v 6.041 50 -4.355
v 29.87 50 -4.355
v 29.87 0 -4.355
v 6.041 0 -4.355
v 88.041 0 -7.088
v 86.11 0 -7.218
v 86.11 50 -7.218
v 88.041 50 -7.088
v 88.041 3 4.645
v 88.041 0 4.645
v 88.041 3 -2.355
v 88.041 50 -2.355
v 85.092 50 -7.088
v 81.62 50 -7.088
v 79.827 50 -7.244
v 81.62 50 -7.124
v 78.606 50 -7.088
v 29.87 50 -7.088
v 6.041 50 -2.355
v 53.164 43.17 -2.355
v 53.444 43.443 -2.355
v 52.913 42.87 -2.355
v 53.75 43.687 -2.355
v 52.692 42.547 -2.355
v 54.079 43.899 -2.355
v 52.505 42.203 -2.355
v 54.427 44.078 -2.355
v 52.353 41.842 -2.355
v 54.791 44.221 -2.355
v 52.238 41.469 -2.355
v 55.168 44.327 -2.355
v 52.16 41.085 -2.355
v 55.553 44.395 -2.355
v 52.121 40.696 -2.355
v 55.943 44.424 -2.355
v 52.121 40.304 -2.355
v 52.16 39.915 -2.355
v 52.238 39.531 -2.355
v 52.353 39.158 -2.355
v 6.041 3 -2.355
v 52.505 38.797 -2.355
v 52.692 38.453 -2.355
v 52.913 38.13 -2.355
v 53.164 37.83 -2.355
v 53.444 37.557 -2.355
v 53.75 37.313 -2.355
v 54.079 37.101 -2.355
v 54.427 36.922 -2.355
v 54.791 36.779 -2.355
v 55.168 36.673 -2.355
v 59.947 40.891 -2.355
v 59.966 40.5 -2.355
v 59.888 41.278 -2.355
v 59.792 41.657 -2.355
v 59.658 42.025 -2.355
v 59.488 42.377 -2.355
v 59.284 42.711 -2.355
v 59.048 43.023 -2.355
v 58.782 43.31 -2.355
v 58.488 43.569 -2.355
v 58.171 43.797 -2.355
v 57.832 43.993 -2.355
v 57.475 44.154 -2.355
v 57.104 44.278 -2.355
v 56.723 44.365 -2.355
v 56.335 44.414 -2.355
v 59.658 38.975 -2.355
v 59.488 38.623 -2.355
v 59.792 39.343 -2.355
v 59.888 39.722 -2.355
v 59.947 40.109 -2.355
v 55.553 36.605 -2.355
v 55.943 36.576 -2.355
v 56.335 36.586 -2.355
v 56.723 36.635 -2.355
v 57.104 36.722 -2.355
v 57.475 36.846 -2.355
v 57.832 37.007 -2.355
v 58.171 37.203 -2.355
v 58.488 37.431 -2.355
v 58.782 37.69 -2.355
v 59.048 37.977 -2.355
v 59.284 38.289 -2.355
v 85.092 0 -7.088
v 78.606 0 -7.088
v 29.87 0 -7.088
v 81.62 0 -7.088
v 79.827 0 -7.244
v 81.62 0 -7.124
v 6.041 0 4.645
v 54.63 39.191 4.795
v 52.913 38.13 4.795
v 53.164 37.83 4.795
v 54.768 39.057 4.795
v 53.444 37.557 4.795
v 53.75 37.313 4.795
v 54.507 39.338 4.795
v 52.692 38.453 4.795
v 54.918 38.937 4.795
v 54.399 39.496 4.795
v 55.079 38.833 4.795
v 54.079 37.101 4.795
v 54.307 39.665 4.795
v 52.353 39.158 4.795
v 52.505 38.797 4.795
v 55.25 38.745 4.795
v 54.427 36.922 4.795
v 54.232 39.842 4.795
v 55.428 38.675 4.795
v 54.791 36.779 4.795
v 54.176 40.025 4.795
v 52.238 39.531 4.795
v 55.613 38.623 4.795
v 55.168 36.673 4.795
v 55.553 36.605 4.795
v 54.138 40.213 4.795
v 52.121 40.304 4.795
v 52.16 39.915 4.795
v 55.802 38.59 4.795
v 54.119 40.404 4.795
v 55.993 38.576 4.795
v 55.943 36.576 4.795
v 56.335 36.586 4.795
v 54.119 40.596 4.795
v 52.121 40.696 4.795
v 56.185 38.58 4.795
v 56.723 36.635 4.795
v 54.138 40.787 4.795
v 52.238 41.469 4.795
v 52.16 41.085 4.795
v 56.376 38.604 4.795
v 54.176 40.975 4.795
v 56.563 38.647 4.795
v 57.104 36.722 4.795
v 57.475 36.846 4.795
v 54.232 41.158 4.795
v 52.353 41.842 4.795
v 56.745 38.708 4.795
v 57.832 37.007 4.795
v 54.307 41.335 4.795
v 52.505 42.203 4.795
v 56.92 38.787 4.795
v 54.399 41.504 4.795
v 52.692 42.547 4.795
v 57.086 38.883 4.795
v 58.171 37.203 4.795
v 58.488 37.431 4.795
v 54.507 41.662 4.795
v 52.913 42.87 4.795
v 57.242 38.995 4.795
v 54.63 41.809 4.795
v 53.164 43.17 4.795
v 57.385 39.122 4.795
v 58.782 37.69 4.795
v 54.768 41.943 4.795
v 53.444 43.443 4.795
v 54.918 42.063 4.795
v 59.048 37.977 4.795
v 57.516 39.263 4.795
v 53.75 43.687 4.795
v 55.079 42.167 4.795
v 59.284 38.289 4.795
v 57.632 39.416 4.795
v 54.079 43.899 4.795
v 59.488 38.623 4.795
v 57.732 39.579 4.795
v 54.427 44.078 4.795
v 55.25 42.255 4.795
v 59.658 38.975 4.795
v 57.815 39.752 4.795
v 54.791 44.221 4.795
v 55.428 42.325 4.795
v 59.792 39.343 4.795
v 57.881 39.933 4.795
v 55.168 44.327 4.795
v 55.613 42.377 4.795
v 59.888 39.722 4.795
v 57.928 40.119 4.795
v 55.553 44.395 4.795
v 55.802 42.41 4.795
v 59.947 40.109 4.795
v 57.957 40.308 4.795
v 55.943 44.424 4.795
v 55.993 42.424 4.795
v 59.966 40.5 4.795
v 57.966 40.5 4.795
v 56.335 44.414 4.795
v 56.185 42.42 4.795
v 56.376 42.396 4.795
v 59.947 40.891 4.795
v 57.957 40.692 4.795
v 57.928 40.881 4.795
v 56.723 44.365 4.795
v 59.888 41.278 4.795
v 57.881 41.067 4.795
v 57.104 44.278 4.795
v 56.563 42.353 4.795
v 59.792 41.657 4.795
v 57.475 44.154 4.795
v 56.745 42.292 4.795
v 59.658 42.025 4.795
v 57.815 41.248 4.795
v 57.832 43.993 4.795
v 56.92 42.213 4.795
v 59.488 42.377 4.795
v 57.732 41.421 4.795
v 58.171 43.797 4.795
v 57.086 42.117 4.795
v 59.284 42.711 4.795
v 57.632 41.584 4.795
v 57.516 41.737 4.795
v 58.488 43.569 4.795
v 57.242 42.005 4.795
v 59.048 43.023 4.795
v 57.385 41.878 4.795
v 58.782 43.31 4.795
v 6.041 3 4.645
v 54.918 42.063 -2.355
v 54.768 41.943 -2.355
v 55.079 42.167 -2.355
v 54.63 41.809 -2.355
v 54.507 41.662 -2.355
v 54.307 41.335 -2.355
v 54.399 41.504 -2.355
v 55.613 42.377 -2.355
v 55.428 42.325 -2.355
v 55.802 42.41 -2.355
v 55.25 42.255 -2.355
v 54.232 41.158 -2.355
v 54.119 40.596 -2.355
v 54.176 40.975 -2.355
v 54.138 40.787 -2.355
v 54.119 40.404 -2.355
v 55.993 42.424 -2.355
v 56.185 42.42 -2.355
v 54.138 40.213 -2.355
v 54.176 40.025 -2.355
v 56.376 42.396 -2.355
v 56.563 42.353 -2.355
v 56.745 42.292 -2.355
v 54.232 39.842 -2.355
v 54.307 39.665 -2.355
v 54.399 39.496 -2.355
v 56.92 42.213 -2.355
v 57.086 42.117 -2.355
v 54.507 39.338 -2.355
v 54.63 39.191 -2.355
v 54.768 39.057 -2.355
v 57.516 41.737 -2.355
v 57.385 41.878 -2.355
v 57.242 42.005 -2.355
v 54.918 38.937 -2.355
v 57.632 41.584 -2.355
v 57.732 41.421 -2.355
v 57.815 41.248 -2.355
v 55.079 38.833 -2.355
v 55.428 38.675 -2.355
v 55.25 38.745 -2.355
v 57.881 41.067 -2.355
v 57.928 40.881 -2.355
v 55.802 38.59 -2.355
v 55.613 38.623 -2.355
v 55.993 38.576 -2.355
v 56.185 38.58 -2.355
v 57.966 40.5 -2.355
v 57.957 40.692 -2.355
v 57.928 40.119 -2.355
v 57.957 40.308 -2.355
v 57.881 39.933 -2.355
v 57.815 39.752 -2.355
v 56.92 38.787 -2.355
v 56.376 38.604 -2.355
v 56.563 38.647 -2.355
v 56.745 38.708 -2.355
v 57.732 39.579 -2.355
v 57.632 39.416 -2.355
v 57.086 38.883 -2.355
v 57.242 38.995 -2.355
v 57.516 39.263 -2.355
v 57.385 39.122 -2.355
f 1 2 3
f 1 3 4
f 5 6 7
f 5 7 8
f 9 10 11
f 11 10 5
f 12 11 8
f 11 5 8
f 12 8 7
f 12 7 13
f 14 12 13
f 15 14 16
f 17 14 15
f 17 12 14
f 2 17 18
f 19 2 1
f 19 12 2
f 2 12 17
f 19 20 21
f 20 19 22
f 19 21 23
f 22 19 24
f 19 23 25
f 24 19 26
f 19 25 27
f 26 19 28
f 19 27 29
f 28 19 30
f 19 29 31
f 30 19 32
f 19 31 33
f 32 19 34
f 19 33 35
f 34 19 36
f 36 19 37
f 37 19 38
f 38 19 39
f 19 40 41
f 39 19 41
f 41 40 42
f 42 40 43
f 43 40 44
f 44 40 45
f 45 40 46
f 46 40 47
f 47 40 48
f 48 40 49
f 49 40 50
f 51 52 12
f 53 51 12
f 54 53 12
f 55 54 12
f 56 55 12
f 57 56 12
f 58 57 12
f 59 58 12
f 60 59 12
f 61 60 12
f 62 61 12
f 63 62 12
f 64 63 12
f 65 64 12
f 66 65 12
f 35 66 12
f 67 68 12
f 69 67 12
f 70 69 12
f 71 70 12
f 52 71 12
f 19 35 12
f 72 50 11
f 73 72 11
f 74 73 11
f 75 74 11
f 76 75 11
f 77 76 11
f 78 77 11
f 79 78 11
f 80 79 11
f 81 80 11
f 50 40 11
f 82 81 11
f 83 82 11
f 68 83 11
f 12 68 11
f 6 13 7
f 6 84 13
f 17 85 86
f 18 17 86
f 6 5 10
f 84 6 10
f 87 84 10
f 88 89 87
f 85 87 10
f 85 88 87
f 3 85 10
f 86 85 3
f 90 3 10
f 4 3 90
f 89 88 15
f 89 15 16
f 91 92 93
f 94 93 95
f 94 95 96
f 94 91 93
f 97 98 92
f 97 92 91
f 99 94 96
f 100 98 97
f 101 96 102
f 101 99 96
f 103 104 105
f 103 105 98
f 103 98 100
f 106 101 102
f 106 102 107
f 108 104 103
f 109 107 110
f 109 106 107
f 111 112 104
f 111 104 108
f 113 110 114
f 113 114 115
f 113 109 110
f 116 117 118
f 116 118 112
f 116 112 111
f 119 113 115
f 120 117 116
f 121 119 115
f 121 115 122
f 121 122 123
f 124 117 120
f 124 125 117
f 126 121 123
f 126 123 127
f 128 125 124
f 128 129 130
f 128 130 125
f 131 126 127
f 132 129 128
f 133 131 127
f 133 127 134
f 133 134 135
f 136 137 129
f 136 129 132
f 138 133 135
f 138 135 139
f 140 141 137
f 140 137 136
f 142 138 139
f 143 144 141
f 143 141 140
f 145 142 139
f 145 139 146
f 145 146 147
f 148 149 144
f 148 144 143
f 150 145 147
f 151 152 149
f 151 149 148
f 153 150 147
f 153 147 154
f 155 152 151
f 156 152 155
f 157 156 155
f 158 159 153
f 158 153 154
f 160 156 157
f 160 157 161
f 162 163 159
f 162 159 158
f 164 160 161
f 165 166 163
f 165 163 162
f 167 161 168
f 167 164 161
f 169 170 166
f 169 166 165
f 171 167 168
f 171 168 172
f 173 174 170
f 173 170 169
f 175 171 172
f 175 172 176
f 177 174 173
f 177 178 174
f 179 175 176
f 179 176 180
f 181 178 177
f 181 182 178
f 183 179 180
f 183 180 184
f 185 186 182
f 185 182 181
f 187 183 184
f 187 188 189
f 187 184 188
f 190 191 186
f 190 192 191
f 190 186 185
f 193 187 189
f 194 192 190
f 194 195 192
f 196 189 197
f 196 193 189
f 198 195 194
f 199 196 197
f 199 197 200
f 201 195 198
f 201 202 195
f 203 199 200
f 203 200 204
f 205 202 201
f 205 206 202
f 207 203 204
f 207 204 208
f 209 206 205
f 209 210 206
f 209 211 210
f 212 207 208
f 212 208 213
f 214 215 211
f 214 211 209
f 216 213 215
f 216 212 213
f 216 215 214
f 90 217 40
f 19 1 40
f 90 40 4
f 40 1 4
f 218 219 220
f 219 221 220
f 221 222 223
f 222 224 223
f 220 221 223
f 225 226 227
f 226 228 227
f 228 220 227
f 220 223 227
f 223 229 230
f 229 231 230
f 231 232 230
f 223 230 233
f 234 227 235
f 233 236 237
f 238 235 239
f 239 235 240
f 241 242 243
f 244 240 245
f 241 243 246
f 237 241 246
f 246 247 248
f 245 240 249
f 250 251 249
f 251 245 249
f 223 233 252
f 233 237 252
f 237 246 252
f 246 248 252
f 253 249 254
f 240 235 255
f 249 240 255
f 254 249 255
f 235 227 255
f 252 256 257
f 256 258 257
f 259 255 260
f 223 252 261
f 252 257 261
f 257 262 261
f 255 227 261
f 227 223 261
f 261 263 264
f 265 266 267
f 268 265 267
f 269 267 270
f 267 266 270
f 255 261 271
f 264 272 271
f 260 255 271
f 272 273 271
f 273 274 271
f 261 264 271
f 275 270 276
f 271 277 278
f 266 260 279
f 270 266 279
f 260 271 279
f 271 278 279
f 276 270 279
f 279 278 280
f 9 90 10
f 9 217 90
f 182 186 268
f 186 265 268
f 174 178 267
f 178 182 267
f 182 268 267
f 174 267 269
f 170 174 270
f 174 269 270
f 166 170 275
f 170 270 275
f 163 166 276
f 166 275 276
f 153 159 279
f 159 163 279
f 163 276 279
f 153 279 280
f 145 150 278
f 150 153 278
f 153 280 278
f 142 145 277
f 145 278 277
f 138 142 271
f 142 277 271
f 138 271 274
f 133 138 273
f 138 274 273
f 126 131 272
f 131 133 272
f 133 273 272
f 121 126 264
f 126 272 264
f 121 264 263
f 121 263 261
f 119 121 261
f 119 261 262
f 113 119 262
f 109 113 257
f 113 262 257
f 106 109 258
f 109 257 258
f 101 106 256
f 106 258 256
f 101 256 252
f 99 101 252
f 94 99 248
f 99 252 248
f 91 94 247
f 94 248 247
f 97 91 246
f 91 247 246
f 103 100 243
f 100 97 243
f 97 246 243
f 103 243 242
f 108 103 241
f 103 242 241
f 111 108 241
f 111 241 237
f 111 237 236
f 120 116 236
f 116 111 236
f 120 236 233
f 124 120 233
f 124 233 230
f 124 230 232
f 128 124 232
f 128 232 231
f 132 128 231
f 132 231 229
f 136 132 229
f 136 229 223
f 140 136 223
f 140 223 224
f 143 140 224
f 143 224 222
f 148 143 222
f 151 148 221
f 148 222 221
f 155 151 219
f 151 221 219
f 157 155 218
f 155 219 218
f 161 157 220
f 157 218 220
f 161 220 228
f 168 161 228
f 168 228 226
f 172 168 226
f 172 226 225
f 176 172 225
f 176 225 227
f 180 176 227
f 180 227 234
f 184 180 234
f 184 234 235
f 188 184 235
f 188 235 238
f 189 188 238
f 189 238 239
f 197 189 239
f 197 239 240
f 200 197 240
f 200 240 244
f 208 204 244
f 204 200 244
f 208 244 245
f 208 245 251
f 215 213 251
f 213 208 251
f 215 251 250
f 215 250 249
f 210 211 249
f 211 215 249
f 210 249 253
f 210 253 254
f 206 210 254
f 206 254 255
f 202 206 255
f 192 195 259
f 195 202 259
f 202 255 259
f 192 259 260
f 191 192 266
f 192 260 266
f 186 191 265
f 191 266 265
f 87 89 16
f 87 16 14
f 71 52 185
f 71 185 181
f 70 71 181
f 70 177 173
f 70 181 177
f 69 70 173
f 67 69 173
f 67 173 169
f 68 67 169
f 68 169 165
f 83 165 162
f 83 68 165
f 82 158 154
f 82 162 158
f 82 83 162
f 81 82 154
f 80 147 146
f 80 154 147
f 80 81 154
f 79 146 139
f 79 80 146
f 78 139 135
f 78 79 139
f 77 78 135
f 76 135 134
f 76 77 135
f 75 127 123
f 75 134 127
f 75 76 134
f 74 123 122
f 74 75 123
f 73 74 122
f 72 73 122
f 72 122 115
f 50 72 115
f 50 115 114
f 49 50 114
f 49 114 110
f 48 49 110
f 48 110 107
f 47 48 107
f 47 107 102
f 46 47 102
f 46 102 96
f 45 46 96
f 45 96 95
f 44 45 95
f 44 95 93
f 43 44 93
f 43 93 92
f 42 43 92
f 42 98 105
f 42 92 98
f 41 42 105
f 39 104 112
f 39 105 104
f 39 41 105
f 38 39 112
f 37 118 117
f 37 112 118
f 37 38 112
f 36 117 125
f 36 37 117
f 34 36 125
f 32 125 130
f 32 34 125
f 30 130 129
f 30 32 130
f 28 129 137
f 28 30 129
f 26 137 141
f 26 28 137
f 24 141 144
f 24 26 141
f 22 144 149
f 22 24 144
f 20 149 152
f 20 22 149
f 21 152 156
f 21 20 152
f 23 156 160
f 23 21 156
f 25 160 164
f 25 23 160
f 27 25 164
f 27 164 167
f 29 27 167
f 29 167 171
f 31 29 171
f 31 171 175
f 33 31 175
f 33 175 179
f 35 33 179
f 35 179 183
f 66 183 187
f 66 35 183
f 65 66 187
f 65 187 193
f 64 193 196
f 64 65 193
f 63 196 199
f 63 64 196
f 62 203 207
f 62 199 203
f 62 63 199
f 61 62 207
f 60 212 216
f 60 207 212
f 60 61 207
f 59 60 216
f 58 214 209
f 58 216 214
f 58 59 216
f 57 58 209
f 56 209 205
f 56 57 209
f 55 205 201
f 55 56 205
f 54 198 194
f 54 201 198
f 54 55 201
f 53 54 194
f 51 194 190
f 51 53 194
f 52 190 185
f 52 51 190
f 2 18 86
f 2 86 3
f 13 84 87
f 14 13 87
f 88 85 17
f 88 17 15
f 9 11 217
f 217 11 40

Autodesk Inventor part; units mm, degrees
ref_plane "YZ Plane" through (0, 0, 0) normal (1, 0, 0) x (0, 1, 0)
ref_plane "XZ Plane" through (0, 0, 0) normal (0, 1, 0) x (-1, 0, 0)
ref_plane "XY Plane" through (0, 0, 0) normal (0, 0, 1) x (1, 0, 0)
ref_plane "Work Plane1" through (88.0411, 0, -4.3553) normal (0, 1, 0) x (-1, 0, 0)
sketch "Sketch1" plane through (88.0411, 0, -4.3553) normal (0, 1, 0) x (-1, 0, 0)
  line L0 (58.171, -0.729) -> (56.0977, -0.729) projected
  line L1 (56.0977, -0.729) -> (54.0127, -0.3924) projected
  line L2 (54.0127, -0.3924) -> (50.0902, -0.0001) projected
  line L3 (50.0902, -0.0001) -> (48.159, -0.0001) projected
  line L4 (48.159, -0.0001) -> (48.159, -0.9194) projected
  line L5 (48.159, -0.9194) -> (46.281, -0.9194) projected
  line L6 (46.281, -0.9194) -> (44.3734, -0.6114) projected
  line L7 (44.3734, -0.6114) -> (42.5702, -0.4904) projected
  line L8 (42.5702, -0.4904) -> (38.7992, -0.4904) projected
  line L9 (38.7992, -0.4904) -> (36.9307, -0.729) projected
  line L10 (36.9307, -0.729) -> (35.0405, -1.2743) projected
  line L11 (35.0405, -1.2743) -> (32.7869, -1.7551) projected
  line L12 (32.7869, -1.7551) -> (31.1597, -2.2246) projected
  line L13 (31.1597, -2.2246) -> (29.2392, -2.5119) projected
  line L14 (29.2392, -2.5119) -> (25.7568, -2.5119) projected
  line L15 (25.7568, -2.5119) -> (22.1476, -1.9292) projected
  line L16 (22.1476, -1.9292) -> (20.1771, -1.9292) projected
  line L17 (20.1771, -1.9292) -> (20.1771, -3.0939) projected
  line L18 (20.1771, -3.0939) -> (15.2755, -3.0939) projected
  line L19 (15.2755, -3.0939) -> (12.2384, -2.6036) projected
  line L20 (12.2384, -2.6036) -> (10.4528, -2.6036) projected
  line L21 (10.4528, -2.6036) -> (8.2143, -2.8887) projected
  line L22 (8.2143, -2.8887) -> (6.4213, -2.7683) projected
  line L23 (6.4213, -2.7683) -> (6.4213, -2.4041) projected
  line L24 (6.4213, -2.4041) -> (3.9663, -2.6036) projected
  line L25 (3.9663, -2.6036) -> (1.931, -2.8628) projected
  line L26 (1.931, -2.8628) -> (-0.0002, -2.7332) projected
  line L27 (-0.0002, -2.7332) -> (-0.0002, -9.8132) projected
  line L28 (-0.0002, -9.8132) -> (-6.1102, -9.8132) projected
  line L29 (-6.1102, -9.8132) -> (-6.1102, -18.749) projected
  line L30 (-6.1102, -18.749) -> (58.171, -18.749) projected
  line L31 (58.171, -18.749) -> (58.171, -0.729) projected
  line L32 (58.171, -0.0001) -> (-0.0002, -0.0001)
  line L33 (-0.0002, -0.0001) -> (-0.0002, -2.7332)
  line L34 (-0.0002, -2.7332) -> (58.171, -2.7332)
  line L35 (58.171, -2.7332) -> (58.171, -0.0001)
  line L36 (-0.0002, -0.0001) -> (81.9998, -0.0001)
  line L37 (81.9998, -0.0001) -> (81.9998, 1.9999)
  line L38 (81.9998, 1.9999) -> (-0.0002, 1.9999)
  line L39 (-0.0002, 1.9999) -> (-0.0002, -0.0001)
  point P0 (88.0411, 4.3553)
  point P1 (2.9486, -2.7332)
  point P2 (6.4213, -2.7332)
  point P3 (9.4352, -2.7332)
  point P4 (31.9998, 9.1499)
  point P5 (20.1771, -2.7332)
  point P6 (13.0411, -2.7332)
  point P7 (48.159, -0.0001)
  point P8 (58.171, -2.7332)
  point P9 (50.0902, -0.0001)
  dimension "d0" = 2
  dimension "d13" = 50
extrude "Extrusion1" add sketch "Sketch1" along normal blind 50 contours L31 L34 L17 L16 L15 L14 L13 L12 L11 L10 L9 L8 L7 L6 L5 L4 L3 L2 L1 L0 | L0 L1 L2 L32 L35 | L32 L3 L39 L38 L37 L36 | L34 L19 L20 L21 L23 L24 L25 L33 L32 L4 L5 L6 L7 L8 L9 L10 L11 L12 L13 L14 L15 L16 L17 | L34 L21 L20 L19 | L21 L22 L23 L34 | L34 L25 L24 L23 | L34 L25 L26
sketch "Sketch2" plane through (6.0413, 0, -2.3554) normal (0, 0, 1) x (1, 0, 0)
  line L0 (2.0733, 0) -> (0, 0) projected
  line L1 (82, 0) -> (82, 50) projected
  line L2 (0, 0) -> (82, 0)
  line L3 (82, 0) -> (82, 3)
  line L4 (82, 3) -> (0, 3)
  line L5 (0, 3) -> (0, 0)
  circle A0 centre (50, 40.5) radius 32 construction
  line L6 (58.1712, -304.8) -> (58.1712, 304.8) construction
  circle A1 centre (50, 40.5) radius 3.925
  circle A2 centre (50, 40.5) radius 1.925
  point P0 (-6.0413, 0)
  point P1 (10, 40.5)
  dimension "d3" = 3
  dimension "d6" = 64
  dimension "d7" = 37.5
  dimension "d8" = 32
  dimension "d9" = 7.85
  dimension "d10" = 2
  dimension "d14" = 40
extrude "Extrusion2" add sketch "Sketch2" along normal blind 7 contours L0 L5 L4 L1 L2
extrude "Extrusion3" add sketch "Sketch2" along normal blind 7.15 contours A1
equation "\"t\" = 0.15"
properties part number "backCase"
